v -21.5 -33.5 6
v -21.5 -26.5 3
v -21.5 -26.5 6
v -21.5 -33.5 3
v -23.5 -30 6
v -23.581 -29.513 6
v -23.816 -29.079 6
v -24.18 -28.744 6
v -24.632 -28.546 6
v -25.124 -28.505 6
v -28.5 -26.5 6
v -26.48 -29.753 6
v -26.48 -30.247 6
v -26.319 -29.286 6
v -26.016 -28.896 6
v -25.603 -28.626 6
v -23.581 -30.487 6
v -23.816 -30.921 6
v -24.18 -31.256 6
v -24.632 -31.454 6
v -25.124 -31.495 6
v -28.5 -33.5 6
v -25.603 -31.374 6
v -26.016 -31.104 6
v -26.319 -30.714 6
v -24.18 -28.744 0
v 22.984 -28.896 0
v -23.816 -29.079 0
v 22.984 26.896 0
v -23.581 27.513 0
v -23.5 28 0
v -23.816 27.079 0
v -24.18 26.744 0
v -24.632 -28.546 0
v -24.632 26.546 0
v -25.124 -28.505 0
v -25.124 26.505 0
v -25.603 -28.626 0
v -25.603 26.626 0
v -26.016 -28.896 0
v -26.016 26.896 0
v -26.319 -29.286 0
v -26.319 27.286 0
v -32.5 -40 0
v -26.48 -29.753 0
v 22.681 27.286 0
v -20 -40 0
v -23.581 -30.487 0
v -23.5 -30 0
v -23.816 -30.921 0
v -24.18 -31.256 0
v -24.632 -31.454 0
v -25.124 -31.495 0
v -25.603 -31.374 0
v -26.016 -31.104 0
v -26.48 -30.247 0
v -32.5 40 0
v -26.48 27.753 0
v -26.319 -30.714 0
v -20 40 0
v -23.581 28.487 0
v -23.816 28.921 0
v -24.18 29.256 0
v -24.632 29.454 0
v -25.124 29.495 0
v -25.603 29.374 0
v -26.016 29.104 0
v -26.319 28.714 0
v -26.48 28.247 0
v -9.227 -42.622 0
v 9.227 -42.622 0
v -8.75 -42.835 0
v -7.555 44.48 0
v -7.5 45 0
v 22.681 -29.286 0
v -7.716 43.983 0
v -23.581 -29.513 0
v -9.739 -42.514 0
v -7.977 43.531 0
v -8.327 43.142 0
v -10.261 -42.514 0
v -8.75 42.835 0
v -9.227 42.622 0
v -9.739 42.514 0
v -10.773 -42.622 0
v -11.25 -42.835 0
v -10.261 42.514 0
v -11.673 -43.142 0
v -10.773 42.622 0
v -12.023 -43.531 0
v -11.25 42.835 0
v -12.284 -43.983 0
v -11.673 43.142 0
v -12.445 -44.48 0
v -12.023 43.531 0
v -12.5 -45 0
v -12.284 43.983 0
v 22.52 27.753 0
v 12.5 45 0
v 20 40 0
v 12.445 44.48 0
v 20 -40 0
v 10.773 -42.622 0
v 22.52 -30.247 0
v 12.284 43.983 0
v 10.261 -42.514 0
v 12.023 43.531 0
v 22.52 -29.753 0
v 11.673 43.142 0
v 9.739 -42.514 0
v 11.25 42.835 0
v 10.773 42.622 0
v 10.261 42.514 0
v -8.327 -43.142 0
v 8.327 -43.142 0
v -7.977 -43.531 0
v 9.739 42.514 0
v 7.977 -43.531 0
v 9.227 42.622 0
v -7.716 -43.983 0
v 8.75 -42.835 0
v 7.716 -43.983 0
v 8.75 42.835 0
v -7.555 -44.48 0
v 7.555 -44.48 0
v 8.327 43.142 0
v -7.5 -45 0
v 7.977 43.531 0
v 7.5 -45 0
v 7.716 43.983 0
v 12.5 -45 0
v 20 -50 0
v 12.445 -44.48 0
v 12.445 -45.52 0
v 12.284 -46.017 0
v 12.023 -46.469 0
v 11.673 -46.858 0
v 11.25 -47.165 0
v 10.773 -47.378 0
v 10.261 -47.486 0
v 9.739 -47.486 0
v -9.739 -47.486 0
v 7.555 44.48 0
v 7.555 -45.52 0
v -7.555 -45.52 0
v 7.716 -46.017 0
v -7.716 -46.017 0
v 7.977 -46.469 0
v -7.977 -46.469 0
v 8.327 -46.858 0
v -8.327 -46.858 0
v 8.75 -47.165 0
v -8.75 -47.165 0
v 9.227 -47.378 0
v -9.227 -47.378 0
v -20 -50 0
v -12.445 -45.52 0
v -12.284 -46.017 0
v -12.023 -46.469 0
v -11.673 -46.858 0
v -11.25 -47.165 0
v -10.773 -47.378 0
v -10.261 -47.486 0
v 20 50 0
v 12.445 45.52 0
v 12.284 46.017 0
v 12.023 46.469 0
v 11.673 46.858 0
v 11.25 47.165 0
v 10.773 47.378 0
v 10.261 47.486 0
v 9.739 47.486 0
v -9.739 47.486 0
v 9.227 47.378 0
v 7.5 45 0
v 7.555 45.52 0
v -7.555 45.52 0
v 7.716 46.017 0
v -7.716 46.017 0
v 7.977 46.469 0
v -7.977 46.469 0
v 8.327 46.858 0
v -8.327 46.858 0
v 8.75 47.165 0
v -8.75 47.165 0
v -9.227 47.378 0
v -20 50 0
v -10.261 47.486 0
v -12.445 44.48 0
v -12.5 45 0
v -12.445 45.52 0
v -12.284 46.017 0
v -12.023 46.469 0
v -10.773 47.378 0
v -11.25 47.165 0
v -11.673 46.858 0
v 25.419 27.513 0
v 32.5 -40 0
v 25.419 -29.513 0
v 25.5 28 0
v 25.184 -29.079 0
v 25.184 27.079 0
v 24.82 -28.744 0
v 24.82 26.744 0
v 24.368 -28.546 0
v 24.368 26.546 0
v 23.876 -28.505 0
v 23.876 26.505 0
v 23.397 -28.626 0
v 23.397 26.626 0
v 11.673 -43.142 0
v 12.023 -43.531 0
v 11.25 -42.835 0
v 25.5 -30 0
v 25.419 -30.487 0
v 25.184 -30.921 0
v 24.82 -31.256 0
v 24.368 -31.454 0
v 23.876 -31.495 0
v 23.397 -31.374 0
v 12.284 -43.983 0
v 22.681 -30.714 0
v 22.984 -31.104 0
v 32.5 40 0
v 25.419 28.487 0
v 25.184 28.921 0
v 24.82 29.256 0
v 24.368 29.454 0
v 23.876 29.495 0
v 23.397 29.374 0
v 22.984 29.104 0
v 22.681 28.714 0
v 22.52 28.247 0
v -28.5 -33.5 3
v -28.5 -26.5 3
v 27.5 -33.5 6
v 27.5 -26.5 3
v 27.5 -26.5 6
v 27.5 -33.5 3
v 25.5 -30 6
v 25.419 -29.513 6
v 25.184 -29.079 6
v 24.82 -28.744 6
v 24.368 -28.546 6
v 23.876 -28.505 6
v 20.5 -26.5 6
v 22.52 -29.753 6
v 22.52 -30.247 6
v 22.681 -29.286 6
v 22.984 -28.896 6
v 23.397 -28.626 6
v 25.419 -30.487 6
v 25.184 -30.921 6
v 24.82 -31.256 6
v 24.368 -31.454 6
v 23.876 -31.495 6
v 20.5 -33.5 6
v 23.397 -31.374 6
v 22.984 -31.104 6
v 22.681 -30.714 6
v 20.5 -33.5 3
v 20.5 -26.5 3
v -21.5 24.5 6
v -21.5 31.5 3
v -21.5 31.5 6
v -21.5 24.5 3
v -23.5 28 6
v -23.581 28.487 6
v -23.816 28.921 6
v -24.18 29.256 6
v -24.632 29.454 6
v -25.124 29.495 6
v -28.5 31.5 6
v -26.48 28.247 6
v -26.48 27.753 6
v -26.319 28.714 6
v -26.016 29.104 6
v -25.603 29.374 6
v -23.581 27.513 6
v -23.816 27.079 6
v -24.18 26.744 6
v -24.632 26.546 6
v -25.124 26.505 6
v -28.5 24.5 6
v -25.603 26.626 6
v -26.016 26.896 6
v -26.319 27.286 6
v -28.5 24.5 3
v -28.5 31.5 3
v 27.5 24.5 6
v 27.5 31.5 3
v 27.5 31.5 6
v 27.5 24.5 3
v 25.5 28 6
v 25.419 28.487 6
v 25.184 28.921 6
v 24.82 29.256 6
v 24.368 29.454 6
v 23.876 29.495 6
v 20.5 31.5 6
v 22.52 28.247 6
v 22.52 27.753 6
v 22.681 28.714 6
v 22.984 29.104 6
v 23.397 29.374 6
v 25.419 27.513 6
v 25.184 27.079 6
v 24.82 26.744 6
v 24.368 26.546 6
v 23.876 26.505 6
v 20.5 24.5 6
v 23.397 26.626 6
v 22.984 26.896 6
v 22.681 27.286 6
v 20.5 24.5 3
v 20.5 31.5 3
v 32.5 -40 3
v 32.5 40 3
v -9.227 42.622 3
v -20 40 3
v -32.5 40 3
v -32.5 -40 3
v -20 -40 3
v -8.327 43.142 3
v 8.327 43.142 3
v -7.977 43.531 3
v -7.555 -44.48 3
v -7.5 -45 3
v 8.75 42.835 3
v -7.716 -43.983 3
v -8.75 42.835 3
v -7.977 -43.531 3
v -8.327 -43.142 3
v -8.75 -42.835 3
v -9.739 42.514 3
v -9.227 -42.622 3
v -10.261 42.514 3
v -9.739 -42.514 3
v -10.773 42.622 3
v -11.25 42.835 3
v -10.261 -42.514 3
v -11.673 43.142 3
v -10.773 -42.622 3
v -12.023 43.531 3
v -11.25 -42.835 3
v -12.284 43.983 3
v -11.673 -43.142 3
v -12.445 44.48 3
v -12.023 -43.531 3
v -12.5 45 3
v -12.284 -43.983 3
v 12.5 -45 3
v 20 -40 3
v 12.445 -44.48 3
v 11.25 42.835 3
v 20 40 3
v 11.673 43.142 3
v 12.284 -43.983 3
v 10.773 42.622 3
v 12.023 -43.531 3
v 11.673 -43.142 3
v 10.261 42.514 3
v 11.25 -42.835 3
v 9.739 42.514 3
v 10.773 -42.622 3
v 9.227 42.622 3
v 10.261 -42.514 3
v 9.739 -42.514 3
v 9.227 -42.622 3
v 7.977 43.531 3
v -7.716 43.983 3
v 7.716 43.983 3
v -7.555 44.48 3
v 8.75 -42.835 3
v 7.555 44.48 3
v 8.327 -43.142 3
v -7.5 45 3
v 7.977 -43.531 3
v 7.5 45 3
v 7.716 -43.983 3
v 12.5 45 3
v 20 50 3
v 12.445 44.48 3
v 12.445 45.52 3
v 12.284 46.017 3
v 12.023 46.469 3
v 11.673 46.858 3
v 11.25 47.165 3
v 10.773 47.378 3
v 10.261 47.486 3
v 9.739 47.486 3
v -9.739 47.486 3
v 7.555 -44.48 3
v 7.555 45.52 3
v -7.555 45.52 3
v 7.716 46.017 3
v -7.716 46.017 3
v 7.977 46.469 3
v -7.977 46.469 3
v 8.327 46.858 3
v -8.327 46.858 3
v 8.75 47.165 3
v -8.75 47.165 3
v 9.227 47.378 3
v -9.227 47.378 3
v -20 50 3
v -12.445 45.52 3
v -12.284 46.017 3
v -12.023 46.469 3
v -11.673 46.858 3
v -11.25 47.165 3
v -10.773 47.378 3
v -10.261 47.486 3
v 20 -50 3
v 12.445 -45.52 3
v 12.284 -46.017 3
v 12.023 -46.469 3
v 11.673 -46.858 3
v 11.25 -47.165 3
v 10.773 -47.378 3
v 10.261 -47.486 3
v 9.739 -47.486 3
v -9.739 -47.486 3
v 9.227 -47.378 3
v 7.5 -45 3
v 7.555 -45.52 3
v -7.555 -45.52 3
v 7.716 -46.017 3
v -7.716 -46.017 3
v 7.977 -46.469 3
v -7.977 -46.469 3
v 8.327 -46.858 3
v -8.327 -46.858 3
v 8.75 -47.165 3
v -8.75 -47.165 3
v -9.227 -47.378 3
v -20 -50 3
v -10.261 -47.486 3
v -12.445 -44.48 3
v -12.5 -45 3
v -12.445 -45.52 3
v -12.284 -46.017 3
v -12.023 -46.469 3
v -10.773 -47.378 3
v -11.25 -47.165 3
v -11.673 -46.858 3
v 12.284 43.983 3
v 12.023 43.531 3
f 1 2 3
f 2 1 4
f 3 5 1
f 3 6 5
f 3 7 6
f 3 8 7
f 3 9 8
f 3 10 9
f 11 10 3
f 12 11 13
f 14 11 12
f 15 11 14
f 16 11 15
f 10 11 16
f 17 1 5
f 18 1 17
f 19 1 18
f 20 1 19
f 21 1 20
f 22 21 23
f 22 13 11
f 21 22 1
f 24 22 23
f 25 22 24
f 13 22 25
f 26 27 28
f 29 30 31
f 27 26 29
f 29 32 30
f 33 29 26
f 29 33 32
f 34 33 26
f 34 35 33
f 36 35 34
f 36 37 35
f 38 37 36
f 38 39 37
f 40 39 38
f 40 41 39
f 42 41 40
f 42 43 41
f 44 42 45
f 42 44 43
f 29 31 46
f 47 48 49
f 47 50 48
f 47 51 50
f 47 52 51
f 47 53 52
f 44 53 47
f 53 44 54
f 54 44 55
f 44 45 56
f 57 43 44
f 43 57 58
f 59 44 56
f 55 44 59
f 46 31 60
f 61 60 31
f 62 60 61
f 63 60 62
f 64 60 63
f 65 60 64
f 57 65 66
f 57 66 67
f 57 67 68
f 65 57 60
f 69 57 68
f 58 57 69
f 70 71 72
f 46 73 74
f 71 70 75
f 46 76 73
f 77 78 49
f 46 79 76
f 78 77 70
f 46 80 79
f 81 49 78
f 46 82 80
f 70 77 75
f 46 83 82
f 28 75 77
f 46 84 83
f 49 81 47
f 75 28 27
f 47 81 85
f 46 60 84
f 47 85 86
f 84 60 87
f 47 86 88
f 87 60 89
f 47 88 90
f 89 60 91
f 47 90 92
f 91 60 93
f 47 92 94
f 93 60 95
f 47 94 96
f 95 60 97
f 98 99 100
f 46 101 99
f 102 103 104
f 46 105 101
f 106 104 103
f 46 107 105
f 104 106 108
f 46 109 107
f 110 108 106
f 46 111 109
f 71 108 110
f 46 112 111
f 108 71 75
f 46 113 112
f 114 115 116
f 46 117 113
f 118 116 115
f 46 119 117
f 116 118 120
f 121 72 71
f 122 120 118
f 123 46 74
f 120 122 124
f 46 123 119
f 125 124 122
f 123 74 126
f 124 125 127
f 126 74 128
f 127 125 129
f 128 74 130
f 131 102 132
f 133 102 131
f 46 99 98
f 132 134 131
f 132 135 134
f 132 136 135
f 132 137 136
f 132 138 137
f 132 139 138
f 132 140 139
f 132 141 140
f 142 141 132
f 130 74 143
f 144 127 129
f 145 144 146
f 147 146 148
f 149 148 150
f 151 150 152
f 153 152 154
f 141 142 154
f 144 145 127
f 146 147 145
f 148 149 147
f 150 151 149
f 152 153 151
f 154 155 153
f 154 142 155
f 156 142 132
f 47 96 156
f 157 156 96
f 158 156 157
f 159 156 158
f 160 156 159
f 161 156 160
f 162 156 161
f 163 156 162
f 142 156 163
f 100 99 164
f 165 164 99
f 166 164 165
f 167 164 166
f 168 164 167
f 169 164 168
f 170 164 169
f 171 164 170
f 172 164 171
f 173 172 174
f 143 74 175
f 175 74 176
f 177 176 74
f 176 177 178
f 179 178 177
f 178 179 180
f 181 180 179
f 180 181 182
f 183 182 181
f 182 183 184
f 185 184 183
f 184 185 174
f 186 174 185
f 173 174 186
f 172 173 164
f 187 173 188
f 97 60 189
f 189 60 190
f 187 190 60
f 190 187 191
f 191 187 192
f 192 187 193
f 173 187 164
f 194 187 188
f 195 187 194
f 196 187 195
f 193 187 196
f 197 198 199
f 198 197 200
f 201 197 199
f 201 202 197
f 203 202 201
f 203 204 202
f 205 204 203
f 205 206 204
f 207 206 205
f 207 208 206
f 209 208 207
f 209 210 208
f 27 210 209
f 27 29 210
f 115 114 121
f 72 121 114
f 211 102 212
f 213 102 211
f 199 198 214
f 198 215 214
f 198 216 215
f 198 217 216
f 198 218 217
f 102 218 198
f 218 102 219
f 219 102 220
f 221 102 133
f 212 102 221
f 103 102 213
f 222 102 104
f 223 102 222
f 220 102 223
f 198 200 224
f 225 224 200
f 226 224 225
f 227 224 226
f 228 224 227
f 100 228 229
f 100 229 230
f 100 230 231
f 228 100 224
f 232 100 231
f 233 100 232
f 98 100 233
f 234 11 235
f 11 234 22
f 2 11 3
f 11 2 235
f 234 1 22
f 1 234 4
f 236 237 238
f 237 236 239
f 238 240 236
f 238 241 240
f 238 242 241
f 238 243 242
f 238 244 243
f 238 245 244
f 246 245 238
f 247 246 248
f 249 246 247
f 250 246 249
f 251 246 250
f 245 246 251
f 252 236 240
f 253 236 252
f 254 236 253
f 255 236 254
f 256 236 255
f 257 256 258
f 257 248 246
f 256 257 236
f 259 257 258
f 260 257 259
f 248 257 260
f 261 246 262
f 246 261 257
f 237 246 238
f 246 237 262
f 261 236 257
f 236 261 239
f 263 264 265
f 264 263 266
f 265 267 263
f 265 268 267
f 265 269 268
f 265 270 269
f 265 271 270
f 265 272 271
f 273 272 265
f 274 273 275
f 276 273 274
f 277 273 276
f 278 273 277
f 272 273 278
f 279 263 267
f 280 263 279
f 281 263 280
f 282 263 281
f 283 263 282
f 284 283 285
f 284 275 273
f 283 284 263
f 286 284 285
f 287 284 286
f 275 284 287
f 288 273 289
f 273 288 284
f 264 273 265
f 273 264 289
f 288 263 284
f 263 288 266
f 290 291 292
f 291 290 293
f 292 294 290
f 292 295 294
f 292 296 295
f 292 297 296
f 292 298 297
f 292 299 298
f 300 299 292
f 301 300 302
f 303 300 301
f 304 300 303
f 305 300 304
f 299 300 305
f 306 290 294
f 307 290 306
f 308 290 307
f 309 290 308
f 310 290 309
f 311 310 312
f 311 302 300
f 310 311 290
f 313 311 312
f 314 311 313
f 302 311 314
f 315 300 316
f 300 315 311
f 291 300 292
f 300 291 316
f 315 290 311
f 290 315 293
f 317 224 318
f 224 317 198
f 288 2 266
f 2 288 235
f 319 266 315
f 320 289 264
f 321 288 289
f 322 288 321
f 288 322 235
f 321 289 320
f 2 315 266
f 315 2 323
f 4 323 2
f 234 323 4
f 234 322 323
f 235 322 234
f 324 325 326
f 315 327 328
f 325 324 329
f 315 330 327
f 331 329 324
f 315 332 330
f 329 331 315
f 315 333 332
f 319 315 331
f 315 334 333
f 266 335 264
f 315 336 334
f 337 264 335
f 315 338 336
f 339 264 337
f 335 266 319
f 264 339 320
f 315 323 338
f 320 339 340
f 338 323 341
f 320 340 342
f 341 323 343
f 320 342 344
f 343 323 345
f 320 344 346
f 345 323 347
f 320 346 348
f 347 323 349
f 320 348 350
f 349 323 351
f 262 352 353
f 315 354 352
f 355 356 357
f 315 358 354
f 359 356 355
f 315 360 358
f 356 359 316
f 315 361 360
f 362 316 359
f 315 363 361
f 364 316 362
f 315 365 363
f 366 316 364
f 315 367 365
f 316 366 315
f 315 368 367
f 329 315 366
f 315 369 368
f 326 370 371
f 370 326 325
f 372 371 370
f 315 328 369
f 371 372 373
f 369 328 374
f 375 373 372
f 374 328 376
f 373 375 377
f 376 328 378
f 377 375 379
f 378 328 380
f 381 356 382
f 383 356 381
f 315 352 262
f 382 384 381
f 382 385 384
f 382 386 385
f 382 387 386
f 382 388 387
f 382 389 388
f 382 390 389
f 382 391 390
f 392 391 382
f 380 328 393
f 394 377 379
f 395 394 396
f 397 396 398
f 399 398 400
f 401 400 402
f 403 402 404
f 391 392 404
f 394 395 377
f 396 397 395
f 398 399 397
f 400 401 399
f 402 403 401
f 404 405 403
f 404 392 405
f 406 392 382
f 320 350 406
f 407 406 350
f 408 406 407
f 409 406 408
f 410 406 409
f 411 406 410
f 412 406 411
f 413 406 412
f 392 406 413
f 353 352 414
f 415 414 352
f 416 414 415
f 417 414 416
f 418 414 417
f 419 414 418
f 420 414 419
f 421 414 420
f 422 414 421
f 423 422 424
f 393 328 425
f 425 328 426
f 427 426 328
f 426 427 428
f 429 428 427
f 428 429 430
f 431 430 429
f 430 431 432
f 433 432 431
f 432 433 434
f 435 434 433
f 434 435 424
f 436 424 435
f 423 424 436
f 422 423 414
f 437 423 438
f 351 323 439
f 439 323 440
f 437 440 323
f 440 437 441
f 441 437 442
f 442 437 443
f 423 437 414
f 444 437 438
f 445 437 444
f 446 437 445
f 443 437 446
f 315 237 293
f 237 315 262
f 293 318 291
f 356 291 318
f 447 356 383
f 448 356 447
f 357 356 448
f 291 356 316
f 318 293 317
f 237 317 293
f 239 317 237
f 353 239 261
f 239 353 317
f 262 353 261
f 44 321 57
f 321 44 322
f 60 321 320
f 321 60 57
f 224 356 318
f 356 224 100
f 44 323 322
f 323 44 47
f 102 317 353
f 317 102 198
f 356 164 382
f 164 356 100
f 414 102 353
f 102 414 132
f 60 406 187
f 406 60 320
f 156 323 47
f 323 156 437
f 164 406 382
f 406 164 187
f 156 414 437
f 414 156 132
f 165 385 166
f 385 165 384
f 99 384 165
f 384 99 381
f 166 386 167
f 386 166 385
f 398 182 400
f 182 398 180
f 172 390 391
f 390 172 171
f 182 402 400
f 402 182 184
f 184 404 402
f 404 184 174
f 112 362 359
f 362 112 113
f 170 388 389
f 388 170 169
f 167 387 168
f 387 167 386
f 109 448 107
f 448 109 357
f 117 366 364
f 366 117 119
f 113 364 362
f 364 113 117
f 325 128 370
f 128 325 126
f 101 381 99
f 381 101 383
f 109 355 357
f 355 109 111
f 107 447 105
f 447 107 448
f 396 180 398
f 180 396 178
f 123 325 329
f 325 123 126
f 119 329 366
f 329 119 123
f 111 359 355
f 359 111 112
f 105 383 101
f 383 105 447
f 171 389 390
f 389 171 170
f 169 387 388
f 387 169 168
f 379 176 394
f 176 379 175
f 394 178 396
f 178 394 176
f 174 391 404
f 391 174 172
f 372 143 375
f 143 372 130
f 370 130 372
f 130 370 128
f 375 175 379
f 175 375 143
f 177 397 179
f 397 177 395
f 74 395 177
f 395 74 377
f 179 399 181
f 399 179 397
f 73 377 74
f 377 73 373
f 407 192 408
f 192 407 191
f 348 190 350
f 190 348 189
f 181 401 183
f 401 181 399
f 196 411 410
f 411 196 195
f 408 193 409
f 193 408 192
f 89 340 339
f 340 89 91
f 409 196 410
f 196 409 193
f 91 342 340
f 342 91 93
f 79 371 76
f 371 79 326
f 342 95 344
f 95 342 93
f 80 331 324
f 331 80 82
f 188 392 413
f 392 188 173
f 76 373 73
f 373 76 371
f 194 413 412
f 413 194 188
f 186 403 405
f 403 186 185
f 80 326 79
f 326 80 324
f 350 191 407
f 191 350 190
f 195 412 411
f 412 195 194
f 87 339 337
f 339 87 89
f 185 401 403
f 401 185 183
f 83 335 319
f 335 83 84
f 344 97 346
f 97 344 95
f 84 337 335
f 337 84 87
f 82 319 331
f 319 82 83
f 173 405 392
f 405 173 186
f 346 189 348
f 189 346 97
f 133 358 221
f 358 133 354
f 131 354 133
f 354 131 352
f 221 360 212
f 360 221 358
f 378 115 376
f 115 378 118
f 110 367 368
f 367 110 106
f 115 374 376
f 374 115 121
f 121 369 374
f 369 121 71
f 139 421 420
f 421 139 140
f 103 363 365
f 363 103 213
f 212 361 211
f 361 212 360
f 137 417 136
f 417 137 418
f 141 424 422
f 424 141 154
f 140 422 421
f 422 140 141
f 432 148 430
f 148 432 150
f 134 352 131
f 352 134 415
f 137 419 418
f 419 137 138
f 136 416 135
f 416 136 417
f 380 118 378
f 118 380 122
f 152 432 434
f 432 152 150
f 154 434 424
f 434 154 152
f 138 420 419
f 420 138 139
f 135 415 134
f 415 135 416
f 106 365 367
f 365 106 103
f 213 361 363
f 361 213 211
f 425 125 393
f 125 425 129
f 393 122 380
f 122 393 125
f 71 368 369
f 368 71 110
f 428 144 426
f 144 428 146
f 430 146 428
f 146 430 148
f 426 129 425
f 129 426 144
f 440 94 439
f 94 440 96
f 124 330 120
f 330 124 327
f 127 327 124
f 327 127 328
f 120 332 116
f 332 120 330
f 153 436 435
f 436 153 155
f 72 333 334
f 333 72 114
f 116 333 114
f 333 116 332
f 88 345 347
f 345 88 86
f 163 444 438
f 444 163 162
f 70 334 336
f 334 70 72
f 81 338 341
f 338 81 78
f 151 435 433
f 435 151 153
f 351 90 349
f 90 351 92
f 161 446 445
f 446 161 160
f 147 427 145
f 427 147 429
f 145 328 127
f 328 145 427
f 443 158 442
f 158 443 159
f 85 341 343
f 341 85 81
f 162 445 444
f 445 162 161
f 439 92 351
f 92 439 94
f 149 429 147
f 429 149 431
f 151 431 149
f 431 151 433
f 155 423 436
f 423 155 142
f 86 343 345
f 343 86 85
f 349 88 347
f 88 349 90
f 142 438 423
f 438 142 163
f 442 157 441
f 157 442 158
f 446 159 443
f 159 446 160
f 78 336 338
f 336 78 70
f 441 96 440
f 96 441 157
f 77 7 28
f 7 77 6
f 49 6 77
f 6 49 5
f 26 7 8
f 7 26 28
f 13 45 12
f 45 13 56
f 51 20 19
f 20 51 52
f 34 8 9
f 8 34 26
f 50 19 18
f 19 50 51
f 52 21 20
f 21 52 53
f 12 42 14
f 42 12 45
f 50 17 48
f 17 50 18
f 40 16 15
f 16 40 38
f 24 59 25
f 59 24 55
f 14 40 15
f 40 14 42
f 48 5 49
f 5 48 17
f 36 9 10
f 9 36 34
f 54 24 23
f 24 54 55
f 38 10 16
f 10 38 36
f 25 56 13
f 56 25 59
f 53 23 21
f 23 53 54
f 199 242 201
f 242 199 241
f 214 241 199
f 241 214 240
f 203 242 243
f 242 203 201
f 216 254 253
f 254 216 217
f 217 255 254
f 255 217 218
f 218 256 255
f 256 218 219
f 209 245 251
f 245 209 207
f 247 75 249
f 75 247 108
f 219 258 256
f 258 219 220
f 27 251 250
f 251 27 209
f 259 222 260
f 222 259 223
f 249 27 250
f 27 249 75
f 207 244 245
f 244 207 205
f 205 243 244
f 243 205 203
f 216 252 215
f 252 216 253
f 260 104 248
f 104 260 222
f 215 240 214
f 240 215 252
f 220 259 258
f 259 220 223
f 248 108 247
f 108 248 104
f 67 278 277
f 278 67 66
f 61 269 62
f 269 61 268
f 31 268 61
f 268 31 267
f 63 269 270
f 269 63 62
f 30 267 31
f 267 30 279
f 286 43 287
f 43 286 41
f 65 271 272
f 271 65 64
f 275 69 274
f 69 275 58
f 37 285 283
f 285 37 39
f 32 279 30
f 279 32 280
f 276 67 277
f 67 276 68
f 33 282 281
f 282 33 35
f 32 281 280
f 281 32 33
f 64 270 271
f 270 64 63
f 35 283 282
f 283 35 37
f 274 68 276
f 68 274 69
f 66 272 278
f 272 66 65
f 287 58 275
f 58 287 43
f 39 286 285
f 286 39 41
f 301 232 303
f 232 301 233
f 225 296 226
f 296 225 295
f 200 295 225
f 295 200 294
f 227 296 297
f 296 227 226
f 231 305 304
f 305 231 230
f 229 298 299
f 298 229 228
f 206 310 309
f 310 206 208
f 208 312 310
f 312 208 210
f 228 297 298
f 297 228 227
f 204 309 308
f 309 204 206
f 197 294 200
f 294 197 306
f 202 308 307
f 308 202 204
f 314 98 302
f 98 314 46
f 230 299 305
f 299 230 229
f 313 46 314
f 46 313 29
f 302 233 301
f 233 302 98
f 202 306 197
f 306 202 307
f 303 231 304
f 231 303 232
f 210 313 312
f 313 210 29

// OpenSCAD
$fs = 0.5;

module hole(s) cylinder(h=10,d=s, center=true);
module m5hole() { hole(5); };
module m3hole() { hole(3); };
scubeSize = 7;
module scube() { cube([scubeSize,scubeSize,6], center = true); };

module dscube() { difference() { scube(); m3hole(); }}


x = 65;
y = 80;

/*
standardCoordinates = [[-x/2+scubeSize/2,-y/2+scubeSize/2,+1.5],
                      [x/2-scubeSize/2,-y/2+scubeSize/2,+1.5],
                      [x/2-scubeSize/2,y/2-scubeSize/2,+1.5],
                      [-x/2+scubeSize/2,y/2-scubeSize/2,+1.5]
                     ];
*/
yunOffX = -x/2+5;
yunOffY = -y/2;
yunHoles = [
  [  2.54+yunOffX, 15.24+yunOffY, 1.5 ],
  [  17.78+yunOffX, 66.04+yunOffY,  1.5 ],
  [  45.72+yunOffX, 66.04+yunOffY, 1.5 ],
  [  50.8+yunOffX, 13.97+yunOffY, 1.5 ]
  ];

// in Pi2B holes form a rectangle of 58x49
piOffX = -x/2+7.5;
piOffY = -y/2+10;
pi2modelBholes = [ [0+piOffX,0+piOffY,1.5], 
                   [49+piOffX,0+piOffY,1.5], 
                   [0+piOffX,58+piOffY,1.5], 
                   [49+piOffX,58+piOffY,1.5] 
];


supportCoordinates = pi2modelBholes;

vslotHoles = [[10,45,0],[-10,45,0],[10,-45,0],[-10,-45,0]];


module base(scale) { difference()  {union() {cube([x,y,3], center = true); 
                                             cube([40,100,3], center = true);
                                             for (i = supportCoordinates) {                                                
                                                 translate(i) scube();  } 
                                   }; 
                                    for (i = vslotHoles)
                                    {
                                        translate(i) m5hole();
                                    }
                                    for ( i = supportCoordinates) {
                                        translate(i) m3hole();
                                    }
                                    }; }
translate([0,0,1.5]) base(1);
